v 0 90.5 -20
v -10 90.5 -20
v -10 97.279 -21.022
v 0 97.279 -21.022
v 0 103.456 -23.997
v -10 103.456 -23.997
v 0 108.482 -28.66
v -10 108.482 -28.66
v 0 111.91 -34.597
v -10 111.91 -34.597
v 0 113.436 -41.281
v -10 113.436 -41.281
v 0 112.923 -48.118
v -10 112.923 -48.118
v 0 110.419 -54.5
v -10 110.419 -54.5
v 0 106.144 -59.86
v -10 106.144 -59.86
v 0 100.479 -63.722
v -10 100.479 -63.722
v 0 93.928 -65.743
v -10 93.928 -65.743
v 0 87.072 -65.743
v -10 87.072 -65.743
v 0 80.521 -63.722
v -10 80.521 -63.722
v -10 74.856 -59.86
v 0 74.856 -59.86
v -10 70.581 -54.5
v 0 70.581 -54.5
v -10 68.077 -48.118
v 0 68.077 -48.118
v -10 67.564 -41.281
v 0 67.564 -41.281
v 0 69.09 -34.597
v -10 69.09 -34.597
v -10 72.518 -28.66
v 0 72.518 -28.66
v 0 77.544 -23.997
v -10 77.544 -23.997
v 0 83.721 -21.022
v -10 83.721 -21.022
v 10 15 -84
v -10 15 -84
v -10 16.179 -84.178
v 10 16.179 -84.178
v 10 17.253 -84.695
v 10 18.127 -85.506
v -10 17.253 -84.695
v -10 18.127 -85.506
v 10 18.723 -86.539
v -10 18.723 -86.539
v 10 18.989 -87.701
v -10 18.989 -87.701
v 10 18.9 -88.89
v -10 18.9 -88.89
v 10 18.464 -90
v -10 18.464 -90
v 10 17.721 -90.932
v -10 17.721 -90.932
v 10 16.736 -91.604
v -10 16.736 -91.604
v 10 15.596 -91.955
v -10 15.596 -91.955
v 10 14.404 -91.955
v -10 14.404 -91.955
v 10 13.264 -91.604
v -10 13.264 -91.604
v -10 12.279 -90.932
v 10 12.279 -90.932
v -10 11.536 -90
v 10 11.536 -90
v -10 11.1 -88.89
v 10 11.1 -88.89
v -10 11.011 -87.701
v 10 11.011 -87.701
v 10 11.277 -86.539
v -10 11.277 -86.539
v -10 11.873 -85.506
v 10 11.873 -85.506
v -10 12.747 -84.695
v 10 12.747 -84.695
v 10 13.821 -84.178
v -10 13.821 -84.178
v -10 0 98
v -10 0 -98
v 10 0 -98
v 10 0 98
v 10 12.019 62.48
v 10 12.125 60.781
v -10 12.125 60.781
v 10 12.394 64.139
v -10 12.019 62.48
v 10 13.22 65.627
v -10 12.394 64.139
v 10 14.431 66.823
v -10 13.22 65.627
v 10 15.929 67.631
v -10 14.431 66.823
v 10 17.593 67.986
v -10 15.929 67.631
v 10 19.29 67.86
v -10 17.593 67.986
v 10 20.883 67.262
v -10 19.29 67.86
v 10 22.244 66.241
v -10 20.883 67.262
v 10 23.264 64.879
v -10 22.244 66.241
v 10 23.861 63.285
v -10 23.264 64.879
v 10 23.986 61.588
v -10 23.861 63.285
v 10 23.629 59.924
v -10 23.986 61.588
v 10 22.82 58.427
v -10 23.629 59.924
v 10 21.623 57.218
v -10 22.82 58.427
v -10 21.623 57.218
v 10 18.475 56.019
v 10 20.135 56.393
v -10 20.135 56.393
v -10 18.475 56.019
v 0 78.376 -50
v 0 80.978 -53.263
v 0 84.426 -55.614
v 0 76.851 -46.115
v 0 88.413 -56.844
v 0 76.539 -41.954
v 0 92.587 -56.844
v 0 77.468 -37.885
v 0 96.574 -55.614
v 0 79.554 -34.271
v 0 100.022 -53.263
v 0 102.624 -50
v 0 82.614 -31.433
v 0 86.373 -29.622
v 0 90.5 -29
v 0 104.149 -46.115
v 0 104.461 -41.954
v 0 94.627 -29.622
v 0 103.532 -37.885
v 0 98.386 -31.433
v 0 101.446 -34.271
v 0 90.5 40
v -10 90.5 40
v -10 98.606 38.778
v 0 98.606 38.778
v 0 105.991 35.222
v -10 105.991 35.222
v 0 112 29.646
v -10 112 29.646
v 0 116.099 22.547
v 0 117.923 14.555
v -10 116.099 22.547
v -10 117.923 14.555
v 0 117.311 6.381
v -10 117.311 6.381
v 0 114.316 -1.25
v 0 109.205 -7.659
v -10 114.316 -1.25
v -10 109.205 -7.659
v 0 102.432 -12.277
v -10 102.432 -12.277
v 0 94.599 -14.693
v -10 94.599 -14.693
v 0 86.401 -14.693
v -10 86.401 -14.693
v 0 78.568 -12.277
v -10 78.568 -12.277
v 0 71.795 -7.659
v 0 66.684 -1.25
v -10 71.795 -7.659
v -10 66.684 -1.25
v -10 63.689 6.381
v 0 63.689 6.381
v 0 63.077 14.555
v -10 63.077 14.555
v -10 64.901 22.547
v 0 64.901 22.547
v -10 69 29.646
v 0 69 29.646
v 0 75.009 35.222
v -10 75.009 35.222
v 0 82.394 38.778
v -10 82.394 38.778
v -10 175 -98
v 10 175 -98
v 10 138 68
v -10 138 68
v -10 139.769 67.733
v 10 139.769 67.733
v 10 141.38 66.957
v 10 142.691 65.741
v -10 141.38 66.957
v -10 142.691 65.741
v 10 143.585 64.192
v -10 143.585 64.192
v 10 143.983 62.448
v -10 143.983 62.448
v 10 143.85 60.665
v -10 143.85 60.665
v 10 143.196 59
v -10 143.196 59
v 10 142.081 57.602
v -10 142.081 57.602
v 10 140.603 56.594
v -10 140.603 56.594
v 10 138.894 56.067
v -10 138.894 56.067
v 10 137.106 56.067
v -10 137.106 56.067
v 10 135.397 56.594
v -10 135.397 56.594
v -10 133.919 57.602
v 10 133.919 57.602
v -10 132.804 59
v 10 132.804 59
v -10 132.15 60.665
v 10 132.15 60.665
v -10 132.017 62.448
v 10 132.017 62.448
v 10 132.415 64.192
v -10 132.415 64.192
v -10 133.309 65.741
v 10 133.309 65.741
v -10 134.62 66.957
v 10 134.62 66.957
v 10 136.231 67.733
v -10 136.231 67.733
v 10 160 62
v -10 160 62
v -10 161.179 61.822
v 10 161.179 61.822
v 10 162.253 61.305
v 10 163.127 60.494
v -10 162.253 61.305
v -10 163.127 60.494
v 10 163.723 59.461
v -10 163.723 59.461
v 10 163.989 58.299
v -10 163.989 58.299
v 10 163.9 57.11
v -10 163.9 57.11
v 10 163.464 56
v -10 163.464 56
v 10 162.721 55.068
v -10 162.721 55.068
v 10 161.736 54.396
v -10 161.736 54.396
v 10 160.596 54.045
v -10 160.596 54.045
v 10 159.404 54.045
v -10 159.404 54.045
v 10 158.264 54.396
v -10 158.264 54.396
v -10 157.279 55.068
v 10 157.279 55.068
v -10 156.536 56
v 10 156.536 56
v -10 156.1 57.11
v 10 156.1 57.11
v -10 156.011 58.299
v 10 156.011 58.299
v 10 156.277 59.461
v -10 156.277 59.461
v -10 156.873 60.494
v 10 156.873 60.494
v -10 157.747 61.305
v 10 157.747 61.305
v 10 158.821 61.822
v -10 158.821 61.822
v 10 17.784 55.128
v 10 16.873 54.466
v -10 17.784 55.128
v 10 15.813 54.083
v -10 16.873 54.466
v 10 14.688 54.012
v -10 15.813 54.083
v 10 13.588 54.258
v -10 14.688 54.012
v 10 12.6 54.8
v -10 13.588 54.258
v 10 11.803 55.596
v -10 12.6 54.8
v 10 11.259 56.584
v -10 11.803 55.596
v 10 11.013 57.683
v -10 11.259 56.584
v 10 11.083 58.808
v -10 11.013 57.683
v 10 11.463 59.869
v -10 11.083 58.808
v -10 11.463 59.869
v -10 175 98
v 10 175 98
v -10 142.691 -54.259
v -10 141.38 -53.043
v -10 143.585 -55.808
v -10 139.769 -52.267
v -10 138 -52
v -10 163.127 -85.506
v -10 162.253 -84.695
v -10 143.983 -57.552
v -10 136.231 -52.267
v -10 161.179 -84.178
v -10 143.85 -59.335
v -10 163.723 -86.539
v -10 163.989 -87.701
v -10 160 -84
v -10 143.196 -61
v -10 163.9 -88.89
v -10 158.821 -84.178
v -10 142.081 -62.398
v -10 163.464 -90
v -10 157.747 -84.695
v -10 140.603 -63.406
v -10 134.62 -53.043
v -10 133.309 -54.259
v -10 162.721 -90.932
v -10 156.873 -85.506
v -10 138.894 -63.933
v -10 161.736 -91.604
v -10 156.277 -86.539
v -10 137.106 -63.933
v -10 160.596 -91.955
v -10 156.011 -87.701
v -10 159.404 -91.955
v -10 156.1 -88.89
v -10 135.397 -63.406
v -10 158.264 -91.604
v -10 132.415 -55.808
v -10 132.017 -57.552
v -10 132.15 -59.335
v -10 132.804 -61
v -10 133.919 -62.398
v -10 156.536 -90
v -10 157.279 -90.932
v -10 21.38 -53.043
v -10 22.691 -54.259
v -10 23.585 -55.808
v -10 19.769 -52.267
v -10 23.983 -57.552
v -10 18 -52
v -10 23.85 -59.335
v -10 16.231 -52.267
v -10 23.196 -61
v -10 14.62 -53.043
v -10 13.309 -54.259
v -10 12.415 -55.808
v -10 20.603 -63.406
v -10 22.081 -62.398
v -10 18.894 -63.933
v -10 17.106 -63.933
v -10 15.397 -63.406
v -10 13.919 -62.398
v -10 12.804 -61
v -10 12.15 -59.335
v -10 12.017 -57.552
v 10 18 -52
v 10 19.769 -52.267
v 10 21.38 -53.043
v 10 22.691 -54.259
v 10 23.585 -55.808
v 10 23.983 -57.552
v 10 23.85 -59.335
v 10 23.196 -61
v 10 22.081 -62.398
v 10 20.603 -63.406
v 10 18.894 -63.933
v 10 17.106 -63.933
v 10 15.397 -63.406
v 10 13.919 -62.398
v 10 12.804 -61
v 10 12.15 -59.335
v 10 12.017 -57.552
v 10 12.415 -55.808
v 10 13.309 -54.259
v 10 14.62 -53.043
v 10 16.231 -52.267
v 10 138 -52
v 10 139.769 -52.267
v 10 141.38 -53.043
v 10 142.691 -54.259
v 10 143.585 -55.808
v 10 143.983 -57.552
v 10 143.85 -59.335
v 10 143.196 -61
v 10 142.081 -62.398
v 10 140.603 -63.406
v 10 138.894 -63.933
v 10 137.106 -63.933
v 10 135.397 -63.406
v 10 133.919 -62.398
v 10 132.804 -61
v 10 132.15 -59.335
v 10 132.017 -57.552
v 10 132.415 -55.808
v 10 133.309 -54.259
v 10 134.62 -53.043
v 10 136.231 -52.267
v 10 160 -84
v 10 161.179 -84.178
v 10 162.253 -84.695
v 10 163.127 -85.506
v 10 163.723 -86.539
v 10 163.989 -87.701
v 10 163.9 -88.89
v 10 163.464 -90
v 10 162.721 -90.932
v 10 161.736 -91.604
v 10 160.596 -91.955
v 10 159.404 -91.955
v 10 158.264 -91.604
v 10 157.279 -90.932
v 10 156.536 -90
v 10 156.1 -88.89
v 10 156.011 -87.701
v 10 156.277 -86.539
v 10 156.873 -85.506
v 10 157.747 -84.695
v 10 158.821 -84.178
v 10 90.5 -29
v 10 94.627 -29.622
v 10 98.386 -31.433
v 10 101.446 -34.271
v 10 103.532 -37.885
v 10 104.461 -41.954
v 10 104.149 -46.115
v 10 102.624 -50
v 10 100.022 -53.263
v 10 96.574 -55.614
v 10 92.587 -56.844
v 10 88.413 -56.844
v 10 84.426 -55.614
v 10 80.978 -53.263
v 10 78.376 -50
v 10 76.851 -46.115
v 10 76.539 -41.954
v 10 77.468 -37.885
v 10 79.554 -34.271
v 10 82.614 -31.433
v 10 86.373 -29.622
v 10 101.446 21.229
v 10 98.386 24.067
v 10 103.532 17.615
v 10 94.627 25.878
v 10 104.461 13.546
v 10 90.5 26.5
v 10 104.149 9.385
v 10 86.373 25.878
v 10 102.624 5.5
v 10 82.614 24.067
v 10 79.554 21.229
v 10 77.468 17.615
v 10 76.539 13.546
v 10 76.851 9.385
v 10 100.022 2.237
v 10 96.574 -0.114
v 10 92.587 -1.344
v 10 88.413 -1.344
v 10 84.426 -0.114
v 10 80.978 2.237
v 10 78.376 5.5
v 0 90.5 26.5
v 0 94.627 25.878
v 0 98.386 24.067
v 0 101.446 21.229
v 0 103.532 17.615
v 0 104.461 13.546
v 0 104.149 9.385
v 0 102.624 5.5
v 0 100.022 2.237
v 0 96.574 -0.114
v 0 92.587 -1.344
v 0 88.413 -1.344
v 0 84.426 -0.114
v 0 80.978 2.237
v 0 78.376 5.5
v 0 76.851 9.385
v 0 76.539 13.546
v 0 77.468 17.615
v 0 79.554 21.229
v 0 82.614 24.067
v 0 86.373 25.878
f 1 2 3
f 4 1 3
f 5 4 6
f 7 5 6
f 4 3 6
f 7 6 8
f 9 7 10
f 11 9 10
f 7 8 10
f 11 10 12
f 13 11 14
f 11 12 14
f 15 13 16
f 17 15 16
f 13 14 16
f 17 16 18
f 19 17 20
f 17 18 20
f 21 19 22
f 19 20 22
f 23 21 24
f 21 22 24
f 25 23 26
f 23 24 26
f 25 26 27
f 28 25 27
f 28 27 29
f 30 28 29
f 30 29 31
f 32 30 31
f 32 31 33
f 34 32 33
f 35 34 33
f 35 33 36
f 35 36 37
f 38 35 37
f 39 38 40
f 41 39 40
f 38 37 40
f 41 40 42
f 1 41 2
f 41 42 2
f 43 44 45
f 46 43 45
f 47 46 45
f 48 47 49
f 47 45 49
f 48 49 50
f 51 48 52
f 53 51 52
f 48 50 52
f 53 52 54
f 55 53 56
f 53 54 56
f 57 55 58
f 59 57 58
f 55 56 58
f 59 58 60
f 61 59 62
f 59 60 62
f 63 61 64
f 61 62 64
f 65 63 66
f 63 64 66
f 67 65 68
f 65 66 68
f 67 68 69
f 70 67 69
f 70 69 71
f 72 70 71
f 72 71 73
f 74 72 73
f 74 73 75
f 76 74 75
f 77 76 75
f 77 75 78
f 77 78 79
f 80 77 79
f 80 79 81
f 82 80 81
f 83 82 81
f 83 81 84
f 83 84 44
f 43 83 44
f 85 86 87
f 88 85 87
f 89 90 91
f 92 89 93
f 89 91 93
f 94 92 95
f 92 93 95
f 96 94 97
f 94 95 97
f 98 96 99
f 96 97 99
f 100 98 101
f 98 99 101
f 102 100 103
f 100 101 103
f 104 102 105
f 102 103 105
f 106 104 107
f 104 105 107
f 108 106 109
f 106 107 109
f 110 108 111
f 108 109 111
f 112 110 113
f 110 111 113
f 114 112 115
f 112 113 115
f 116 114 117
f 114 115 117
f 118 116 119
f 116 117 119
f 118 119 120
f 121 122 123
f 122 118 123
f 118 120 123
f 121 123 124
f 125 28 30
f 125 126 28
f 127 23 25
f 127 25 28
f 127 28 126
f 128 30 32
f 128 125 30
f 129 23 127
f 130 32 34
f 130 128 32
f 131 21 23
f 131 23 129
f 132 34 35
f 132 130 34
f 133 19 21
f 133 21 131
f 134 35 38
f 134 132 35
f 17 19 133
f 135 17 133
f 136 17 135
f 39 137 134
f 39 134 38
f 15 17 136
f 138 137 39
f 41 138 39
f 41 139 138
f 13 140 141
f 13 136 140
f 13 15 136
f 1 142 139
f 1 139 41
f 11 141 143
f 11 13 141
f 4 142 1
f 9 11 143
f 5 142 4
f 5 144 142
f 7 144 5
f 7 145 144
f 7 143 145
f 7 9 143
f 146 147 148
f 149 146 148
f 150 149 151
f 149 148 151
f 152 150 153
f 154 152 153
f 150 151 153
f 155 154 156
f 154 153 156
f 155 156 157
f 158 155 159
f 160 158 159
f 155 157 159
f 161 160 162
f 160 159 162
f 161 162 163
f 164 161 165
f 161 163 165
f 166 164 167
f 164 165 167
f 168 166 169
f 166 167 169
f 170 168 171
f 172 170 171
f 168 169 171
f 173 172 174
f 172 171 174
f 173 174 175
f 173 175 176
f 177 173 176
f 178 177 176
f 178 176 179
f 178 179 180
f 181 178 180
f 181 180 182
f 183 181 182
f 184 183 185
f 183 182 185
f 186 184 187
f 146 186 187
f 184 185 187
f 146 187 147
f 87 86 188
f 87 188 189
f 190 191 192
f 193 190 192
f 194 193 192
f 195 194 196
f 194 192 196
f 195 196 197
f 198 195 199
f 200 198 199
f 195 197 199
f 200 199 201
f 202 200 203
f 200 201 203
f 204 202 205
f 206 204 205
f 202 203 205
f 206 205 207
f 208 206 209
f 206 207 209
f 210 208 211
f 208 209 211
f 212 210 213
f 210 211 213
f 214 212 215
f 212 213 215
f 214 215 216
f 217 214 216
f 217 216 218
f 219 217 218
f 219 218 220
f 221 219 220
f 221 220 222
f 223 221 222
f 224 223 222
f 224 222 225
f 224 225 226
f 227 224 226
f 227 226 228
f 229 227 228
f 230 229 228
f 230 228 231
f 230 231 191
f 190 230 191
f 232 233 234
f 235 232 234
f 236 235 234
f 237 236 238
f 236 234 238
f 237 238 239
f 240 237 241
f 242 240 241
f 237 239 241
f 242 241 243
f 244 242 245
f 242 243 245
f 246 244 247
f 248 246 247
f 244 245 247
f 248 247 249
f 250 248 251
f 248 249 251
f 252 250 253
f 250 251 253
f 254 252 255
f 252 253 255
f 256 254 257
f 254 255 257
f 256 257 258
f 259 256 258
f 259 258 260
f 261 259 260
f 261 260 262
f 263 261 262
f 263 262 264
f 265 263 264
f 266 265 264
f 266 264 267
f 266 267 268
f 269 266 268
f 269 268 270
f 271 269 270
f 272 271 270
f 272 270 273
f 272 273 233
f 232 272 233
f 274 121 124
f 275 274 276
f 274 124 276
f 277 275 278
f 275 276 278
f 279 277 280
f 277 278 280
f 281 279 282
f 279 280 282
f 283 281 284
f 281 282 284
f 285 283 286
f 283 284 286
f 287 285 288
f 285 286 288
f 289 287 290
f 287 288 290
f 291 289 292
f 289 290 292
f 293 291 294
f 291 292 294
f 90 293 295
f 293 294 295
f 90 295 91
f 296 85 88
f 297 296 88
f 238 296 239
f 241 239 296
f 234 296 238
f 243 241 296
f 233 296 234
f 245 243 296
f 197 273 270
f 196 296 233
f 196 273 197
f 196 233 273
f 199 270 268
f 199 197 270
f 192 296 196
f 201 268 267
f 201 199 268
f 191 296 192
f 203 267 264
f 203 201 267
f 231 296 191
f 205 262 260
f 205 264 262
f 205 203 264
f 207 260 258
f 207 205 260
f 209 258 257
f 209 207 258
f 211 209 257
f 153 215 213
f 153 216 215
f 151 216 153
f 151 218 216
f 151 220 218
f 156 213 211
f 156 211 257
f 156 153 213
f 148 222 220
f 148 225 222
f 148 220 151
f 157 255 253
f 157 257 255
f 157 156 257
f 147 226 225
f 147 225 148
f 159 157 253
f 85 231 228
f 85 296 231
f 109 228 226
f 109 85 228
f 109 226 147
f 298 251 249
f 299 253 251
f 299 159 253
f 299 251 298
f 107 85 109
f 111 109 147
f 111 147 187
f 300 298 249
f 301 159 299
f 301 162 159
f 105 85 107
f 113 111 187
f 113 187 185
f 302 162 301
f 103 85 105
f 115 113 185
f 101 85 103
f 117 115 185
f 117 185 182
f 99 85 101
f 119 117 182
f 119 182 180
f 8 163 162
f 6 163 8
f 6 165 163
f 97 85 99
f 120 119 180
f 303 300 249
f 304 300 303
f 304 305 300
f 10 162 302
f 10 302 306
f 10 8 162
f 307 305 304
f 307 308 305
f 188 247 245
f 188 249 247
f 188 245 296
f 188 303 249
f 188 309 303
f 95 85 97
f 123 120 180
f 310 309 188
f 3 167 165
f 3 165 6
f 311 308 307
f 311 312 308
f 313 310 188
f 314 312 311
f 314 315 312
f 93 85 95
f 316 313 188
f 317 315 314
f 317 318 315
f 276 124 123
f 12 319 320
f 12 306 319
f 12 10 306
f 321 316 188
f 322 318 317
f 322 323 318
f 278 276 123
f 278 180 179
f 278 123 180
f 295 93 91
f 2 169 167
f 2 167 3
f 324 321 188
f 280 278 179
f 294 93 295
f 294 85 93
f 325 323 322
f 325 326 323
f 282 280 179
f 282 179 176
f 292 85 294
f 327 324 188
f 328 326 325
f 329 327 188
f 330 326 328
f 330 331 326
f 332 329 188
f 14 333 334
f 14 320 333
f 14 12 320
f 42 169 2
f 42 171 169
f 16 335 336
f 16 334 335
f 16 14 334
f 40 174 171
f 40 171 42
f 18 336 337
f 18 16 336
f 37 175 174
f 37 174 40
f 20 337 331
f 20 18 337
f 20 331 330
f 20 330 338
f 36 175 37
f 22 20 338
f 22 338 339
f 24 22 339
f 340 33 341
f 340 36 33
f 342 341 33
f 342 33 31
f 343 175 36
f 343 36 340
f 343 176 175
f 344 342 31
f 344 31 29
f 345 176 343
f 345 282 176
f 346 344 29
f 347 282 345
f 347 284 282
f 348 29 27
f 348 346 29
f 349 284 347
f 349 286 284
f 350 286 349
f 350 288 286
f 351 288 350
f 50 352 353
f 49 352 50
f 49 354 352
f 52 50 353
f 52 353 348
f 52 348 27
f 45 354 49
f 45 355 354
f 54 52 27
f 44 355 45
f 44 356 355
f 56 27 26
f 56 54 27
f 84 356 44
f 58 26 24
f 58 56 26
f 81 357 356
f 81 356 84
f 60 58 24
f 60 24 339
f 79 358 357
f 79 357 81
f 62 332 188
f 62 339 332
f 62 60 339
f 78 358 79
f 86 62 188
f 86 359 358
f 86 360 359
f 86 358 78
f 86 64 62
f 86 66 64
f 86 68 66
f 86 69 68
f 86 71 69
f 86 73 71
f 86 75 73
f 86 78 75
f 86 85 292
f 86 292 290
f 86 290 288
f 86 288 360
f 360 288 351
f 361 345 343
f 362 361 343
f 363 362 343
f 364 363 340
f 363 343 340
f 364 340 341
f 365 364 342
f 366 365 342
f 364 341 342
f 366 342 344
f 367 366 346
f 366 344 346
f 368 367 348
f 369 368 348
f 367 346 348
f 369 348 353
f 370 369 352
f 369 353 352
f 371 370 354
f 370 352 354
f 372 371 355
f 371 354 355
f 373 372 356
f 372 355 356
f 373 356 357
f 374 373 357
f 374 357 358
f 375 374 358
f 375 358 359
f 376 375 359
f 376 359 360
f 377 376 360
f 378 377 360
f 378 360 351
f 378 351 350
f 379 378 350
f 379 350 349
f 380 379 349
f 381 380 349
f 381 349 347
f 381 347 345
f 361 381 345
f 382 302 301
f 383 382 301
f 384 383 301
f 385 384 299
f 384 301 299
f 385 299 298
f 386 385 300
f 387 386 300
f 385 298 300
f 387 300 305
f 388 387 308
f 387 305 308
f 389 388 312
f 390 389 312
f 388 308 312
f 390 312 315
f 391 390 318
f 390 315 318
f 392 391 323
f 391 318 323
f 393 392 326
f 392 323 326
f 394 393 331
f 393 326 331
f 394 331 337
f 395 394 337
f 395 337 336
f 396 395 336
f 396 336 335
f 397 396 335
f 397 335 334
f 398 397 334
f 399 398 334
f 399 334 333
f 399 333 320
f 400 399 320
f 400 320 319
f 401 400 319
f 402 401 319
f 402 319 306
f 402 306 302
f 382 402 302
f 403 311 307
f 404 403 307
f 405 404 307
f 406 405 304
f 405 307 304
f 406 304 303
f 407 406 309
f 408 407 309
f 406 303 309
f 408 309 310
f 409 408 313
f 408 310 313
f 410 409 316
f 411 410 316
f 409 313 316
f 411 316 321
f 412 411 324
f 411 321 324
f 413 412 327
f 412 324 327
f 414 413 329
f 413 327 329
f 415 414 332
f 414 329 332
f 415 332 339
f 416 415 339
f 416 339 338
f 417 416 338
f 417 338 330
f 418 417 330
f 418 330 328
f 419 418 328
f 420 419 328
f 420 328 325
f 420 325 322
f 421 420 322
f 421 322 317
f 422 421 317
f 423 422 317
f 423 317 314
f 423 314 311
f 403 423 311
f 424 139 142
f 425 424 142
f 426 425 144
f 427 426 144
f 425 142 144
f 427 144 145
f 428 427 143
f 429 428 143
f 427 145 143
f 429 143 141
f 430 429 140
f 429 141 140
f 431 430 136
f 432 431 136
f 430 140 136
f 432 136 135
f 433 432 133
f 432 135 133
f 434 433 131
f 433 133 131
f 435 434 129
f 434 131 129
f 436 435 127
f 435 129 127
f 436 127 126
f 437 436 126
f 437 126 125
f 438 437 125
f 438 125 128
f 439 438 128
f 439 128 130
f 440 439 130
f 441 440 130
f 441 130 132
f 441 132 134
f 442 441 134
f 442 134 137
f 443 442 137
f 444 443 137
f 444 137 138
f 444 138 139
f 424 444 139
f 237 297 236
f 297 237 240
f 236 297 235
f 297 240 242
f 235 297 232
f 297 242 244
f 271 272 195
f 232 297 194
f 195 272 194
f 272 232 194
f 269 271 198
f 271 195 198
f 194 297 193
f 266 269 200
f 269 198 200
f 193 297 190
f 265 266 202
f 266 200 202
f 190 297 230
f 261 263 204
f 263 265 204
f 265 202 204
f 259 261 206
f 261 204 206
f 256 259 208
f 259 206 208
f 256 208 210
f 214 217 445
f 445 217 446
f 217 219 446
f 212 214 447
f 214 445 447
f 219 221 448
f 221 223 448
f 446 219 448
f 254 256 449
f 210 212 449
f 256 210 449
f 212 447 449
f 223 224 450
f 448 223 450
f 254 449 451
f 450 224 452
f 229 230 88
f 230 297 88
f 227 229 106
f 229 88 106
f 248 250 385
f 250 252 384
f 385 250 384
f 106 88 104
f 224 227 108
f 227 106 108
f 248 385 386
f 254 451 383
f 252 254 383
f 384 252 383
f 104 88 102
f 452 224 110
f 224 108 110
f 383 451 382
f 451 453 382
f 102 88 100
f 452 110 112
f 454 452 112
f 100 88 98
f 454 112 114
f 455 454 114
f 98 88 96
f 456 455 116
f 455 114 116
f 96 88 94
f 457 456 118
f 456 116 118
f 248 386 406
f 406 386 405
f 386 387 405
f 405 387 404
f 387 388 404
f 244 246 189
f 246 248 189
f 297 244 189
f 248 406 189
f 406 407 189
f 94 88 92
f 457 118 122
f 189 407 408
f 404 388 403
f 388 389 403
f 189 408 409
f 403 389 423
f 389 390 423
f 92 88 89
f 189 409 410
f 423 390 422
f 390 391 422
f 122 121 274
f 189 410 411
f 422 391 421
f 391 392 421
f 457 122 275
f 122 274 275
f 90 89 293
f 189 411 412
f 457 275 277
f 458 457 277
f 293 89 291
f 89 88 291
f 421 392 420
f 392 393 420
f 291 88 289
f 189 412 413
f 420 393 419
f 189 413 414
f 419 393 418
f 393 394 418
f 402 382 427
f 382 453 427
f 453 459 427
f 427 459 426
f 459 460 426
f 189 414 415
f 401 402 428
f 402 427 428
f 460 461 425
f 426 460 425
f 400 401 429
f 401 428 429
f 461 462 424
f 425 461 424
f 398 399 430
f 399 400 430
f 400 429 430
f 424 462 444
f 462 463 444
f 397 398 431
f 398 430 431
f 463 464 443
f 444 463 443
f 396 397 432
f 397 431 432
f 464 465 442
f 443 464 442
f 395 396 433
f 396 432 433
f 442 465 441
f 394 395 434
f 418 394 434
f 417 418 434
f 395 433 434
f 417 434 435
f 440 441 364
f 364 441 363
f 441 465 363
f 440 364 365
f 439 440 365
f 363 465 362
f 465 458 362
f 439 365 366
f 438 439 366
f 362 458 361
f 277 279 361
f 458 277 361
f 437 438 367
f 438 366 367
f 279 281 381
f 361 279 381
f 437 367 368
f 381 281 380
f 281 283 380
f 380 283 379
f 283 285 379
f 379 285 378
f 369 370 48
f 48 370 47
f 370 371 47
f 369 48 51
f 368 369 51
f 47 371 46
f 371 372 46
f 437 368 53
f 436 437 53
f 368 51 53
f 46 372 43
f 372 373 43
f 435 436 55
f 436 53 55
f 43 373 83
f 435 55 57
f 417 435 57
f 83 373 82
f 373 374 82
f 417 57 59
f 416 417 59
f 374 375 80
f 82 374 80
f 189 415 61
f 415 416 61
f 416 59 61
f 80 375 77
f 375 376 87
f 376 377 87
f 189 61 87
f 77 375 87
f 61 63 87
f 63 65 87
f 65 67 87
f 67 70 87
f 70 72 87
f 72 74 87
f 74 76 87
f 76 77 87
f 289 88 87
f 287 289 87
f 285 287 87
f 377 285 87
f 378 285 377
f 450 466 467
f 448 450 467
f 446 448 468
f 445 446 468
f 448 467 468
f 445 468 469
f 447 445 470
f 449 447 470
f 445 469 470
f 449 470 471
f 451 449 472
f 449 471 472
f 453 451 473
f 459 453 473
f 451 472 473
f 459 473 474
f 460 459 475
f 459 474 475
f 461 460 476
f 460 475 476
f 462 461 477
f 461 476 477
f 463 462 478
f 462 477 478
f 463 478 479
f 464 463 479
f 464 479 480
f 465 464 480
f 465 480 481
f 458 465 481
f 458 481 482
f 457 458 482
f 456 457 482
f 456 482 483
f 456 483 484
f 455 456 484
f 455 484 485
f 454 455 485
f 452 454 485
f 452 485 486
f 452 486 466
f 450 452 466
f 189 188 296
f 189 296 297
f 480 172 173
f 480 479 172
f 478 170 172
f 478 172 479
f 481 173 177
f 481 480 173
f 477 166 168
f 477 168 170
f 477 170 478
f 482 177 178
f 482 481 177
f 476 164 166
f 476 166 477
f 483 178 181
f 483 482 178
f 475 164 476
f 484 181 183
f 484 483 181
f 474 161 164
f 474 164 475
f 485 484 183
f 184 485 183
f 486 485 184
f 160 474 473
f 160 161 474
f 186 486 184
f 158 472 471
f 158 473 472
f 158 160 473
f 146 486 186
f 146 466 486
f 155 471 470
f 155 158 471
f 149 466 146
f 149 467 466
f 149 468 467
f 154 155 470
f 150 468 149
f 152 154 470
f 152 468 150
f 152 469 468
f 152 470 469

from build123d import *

# Parameters (mm, degrees)
SKETCH1_W           = 20
SKETCH1_H           = 196
BOSS_EXTRUDE1_DEPTH = 175
SKETCH2_R           = 27.5
SKETCH2_R_2         = 23
CUT_EXTRUDE1_DEPTH  = 10
SKETCH3_R           = 14
CUT_EXTRUDE2_DEPTH  = 11
SKETCH4_R           = 4
CUT_EXTRUDE3_DEPTH  = 21
SKETCH5_R           = 6
CUT_EXTRUDE4_DEPTH  = 21


with BuildPart() as part:
    # Sketch1 → Boss-Extrude1 (new body)
    with BuildSketch(Plane(origin=(114, 0, 0), x_dir=(1, 0, 0), z_dir=(0, 1, 0))):
        with Locations((-114, 0)):
            Rectangle(SKETCH1_W, SKETCH1_H)
    extrude(amount=BOSS_EXTRUDE1_DEPTH)

    # Sketch2 → Cut-Extrude1 (cut)
    with BuildSketch(Plane.ZY.offset(10)):
        with Locations((12.5, 90.5)):
            Circle(SKETCH2_R)
        with Locations((-43, 90.5)):
            Circle(SKETCH2_R_2)
    extrude(amount=-CUT_EXTRUDE1_DEPTH, mode=Mode.SUBTRACT)

    # Sketch3 → Cut-Extrude2 (cut, through all)
    with BuildSketch(Plane.ZY):
        with Locations((12.5, 90.5)):
            Circle(SKETCH3_R)
        with Locations((-43, 90.5)):
            Circle(SKETCH3_R)
    extrude(amount=-CUT_EXTRUDE2_DEPTH, mode=Mode.SUBTRACT)

    # Sketch4 → Cut-Extrude3 (cut, through all)
    with BuildSketch(Plane.ZY.offset(10)):
        with Locations((58, 15)):
            Circle(SKETCH4_R)
        with Locations((-88, 15)):
            Circle(SKETCH4_R)
        with Locations((-88, 160)):
            Circle(SKETCH4_R)
        with Locations((58, 160)):
            Circle(SKETCH4_R)
    extrude(amount=-CUT_EXTRUDE3_DEPTH, mode=Mode.SUBTRACT)

    # Sketch5 → Cut-Extrude4 (cut, through all)
    with BuildSketch(Plane.ZY.offset(10)):
        with Locations((62, 138)):
            Circle(SKETCH5_R)
        with Locations((62, 18)):
            Circle(SKETCH5_R)
        with Locations((-58, 138)):
            Circle(SKETCH5_R)
        with Locations((-58, 18)):
            Circle(SKETCH5_R)
    extrude(amount=-CUT_EXTRUDE4_DEPTH, mode=Mode.SUBTRACT)


solid = part.part
